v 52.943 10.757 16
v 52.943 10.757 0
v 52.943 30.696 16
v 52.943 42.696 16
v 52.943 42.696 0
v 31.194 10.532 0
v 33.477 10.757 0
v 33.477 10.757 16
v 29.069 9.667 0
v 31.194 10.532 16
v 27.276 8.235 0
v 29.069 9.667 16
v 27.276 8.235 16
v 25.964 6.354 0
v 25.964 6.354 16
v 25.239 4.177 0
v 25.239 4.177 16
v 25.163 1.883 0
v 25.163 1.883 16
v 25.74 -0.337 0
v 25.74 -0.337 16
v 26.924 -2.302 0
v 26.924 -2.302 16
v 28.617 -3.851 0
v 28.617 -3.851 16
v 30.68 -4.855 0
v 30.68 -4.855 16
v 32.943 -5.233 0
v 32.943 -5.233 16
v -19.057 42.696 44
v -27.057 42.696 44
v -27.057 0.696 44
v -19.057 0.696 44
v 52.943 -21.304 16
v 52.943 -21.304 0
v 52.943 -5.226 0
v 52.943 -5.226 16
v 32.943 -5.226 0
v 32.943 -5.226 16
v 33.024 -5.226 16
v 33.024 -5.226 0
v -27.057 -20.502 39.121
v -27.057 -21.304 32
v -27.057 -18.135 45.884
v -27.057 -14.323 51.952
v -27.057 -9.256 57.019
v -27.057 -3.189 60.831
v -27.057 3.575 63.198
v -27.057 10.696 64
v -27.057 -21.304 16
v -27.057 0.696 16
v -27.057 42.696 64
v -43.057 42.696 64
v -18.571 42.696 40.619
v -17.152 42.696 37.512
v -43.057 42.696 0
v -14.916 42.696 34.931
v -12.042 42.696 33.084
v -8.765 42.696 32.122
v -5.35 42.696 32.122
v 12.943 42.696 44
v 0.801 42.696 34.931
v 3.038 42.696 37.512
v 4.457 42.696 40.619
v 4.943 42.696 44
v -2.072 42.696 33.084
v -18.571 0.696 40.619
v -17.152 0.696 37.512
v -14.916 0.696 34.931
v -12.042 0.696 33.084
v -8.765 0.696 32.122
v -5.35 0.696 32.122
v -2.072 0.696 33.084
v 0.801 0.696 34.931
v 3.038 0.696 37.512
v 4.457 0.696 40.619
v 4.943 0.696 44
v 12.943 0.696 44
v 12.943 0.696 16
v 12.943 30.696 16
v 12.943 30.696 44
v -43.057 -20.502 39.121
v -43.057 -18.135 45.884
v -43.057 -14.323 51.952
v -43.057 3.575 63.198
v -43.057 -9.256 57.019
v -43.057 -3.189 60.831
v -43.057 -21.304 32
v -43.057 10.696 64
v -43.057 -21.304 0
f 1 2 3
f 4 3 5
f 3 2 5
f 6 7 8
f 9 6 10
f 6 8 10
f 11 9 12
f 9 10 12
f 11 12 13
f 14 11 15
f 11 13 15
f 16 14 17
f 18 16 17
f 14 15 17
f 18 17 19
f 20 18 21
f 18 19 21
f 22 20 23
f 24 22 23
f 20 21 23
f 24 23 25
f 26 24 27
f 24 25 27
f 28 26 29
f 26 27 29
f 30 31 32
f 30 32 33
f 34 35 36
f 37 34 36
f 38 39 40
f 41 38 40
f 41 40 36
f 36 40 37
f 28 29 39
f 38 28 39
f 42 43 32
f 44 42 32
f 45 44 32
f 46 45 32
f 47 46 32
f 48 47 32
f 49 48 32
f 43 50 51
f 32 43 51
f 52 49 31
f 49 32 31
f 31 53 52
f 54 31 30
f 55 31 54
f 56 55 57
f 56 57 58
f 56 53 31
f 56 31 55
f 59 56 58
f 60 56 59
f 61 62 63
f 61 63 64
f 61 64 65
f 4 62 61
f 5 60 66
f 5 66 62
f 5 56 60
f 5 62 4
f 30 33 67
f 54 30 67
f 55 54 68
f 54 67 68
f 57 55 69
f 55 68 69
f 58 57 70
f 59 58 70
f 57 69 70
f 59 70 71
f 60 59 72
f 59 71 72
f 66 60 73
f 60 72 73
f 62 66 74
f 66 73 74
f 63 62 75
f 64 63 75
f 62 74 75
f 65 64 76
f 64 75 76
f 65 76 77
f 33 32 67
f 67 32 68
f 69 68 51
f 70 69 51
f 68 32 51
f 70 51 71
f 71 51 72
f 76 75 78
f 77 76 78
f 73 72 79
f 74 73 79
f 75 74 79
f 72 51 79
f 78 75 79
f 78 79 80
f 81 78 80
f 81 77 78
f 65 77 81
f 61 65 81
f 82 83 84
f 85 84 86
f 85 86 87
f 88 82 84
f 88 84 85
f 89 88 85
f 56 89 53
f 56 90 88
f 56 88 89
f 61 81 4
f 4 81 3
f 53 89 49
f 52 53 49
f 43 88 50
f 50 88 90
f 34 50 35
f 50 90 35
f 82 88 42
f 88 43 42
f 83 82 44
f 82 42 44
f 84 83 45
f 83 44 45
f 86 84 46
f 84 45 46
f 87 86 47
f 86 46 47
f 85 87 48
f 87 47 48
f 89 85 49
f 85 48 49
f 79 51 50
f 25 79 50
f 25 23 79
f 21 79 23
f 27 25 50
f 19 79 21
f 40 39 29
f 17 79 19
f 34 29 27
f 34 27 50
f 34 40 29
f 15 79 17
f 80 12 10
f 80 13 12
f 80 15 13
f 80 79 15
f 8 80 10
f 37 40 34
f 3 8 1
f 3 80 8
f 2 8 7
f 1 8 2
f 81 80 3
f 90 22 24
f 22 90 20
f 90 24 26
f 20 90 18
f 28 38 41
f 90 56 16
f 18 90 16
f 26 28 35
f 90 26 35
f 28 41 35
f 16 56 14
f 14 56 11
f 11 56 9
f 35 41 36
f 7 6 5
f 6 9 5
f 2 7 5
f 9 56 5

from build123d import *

# Parameters (mm, degrees)
F0_W      = 96
F0_H      = 64
F1_DEPTH  = 16
F2_W      = 16
F2_H      = 64
F3_DEPTH  = 48
F4_R      = 32
F5_W      = 40
F5_H      = 42
F6_DEPTH  = 28
F8_DEPTH  = 52.07
F9_W      = 40
F9_H      = 12
F10_DEPTH = 28
F12_DEPTH = 25.4
F14_W     = 19.9191475213
F14_H     = 15.9830040127
F15_DEPTH = 25
F17_DEPTH = 25


with BuildPart() as f1:
    # F0 (on Top) → F1 (new body)
    with BuildSketch(Plane.XY):
        with Locations((4.9427039921, 10.6956655151)):
            Rectangle(F0_W, F0_H)
    extrude(amount=F1_DEPTH)

    # F2 (on face) → F3 (join)
    with BuildSketch(Plane.XY.offset(16)):
        with Locations((-35.0572960079, 10.6956655151)):
            Rectangle(F2_W, F2_H)
    extrude(amount=F3_DEPTH)

    # F4
    f4_edges = [f1.edges().sort_by_distance(p)[0] for p in [
        (-35.057296, -21.304334, 64),
    ]]
    fillet(f4_edges, radius=F4_R)

    # F5 (on face) → F6 (join)
    with BuildSketch(Plane.XY.offset(16)):
        with Locations((-7.0572960079, 21.6956655151)):
            Rectangle(F5_W, F5_H)
    extrude(amount=F6_DEPTH)

    # F7 (on face) → F8 (cut)
    with BuildSketch(Plane.XZ.offset(-0.6956655151)):
        with BuildLine():
            ThreePointArc((-19.0572960079, 44), (-7.0572960079, 32), (4.9427039921, 44))
            Line((4.9427039921, 44), (-19.0572960079, 44))
        make_face()
    extrude(amount=-F8_DEPTH, mode=Mode.SUBTRACT)

    # F9 (on face) → F10 (join)
    with BuildSketch(Plane.XY.offset(16)):
        with Locations((32.9427039921, 36.6956655151)):
            Rectangle(F9_W, F9_H)
    extrude(amount=F10_DEPTH)

    # F11 (on face) → F12 (cut)
    with BuildSketch(Plane.XZ.offset(-30.6956655151)):
        Polygon((52.9427039921, 44), (12.9427039921, 44), (52.9427039921, 16), align=None)
    extrude(amount=-F12_DEPTH, mode=Mode.SUBTRACT)

    # F14 (on face) → F15 (cut)
    with BuildSketch(Plane.XY.offset(16)):
        with Locations((42.9831302315, 2.765810062)):
            Rectangle(F14_W, F14_H)
    extrude(amount=-F15_DEPTH, mode=Mode.SUBTRACT)

    # F16 (on face) → F17 (cut)
    with BuildSketch(Plane.XY.offset(16)):
        with BuildLine():
            Line((33.0235564709, 10.7573120683), (33.4770667325, 10.7573120683))
            ThreePointArc((33.4770667325, 10.7573120683), (25.1183803566, 3.0327593017), (32.9427039921, -5.2326089915))
            Line((32.9427039921, -5.2326089915), (32.9427039921, -5.2256919444))
            Line((32.9427039921, -5.2256919444), (33.0235564709, -5.2256919444))
            Line((33.0235564709, -5.2256919444), (33.0235564709, 10.7573120683))
        make_face()
    extrude(amount=-F17_DEPTH, mode=Mode.SUBTRACT)


solid = f1.part
